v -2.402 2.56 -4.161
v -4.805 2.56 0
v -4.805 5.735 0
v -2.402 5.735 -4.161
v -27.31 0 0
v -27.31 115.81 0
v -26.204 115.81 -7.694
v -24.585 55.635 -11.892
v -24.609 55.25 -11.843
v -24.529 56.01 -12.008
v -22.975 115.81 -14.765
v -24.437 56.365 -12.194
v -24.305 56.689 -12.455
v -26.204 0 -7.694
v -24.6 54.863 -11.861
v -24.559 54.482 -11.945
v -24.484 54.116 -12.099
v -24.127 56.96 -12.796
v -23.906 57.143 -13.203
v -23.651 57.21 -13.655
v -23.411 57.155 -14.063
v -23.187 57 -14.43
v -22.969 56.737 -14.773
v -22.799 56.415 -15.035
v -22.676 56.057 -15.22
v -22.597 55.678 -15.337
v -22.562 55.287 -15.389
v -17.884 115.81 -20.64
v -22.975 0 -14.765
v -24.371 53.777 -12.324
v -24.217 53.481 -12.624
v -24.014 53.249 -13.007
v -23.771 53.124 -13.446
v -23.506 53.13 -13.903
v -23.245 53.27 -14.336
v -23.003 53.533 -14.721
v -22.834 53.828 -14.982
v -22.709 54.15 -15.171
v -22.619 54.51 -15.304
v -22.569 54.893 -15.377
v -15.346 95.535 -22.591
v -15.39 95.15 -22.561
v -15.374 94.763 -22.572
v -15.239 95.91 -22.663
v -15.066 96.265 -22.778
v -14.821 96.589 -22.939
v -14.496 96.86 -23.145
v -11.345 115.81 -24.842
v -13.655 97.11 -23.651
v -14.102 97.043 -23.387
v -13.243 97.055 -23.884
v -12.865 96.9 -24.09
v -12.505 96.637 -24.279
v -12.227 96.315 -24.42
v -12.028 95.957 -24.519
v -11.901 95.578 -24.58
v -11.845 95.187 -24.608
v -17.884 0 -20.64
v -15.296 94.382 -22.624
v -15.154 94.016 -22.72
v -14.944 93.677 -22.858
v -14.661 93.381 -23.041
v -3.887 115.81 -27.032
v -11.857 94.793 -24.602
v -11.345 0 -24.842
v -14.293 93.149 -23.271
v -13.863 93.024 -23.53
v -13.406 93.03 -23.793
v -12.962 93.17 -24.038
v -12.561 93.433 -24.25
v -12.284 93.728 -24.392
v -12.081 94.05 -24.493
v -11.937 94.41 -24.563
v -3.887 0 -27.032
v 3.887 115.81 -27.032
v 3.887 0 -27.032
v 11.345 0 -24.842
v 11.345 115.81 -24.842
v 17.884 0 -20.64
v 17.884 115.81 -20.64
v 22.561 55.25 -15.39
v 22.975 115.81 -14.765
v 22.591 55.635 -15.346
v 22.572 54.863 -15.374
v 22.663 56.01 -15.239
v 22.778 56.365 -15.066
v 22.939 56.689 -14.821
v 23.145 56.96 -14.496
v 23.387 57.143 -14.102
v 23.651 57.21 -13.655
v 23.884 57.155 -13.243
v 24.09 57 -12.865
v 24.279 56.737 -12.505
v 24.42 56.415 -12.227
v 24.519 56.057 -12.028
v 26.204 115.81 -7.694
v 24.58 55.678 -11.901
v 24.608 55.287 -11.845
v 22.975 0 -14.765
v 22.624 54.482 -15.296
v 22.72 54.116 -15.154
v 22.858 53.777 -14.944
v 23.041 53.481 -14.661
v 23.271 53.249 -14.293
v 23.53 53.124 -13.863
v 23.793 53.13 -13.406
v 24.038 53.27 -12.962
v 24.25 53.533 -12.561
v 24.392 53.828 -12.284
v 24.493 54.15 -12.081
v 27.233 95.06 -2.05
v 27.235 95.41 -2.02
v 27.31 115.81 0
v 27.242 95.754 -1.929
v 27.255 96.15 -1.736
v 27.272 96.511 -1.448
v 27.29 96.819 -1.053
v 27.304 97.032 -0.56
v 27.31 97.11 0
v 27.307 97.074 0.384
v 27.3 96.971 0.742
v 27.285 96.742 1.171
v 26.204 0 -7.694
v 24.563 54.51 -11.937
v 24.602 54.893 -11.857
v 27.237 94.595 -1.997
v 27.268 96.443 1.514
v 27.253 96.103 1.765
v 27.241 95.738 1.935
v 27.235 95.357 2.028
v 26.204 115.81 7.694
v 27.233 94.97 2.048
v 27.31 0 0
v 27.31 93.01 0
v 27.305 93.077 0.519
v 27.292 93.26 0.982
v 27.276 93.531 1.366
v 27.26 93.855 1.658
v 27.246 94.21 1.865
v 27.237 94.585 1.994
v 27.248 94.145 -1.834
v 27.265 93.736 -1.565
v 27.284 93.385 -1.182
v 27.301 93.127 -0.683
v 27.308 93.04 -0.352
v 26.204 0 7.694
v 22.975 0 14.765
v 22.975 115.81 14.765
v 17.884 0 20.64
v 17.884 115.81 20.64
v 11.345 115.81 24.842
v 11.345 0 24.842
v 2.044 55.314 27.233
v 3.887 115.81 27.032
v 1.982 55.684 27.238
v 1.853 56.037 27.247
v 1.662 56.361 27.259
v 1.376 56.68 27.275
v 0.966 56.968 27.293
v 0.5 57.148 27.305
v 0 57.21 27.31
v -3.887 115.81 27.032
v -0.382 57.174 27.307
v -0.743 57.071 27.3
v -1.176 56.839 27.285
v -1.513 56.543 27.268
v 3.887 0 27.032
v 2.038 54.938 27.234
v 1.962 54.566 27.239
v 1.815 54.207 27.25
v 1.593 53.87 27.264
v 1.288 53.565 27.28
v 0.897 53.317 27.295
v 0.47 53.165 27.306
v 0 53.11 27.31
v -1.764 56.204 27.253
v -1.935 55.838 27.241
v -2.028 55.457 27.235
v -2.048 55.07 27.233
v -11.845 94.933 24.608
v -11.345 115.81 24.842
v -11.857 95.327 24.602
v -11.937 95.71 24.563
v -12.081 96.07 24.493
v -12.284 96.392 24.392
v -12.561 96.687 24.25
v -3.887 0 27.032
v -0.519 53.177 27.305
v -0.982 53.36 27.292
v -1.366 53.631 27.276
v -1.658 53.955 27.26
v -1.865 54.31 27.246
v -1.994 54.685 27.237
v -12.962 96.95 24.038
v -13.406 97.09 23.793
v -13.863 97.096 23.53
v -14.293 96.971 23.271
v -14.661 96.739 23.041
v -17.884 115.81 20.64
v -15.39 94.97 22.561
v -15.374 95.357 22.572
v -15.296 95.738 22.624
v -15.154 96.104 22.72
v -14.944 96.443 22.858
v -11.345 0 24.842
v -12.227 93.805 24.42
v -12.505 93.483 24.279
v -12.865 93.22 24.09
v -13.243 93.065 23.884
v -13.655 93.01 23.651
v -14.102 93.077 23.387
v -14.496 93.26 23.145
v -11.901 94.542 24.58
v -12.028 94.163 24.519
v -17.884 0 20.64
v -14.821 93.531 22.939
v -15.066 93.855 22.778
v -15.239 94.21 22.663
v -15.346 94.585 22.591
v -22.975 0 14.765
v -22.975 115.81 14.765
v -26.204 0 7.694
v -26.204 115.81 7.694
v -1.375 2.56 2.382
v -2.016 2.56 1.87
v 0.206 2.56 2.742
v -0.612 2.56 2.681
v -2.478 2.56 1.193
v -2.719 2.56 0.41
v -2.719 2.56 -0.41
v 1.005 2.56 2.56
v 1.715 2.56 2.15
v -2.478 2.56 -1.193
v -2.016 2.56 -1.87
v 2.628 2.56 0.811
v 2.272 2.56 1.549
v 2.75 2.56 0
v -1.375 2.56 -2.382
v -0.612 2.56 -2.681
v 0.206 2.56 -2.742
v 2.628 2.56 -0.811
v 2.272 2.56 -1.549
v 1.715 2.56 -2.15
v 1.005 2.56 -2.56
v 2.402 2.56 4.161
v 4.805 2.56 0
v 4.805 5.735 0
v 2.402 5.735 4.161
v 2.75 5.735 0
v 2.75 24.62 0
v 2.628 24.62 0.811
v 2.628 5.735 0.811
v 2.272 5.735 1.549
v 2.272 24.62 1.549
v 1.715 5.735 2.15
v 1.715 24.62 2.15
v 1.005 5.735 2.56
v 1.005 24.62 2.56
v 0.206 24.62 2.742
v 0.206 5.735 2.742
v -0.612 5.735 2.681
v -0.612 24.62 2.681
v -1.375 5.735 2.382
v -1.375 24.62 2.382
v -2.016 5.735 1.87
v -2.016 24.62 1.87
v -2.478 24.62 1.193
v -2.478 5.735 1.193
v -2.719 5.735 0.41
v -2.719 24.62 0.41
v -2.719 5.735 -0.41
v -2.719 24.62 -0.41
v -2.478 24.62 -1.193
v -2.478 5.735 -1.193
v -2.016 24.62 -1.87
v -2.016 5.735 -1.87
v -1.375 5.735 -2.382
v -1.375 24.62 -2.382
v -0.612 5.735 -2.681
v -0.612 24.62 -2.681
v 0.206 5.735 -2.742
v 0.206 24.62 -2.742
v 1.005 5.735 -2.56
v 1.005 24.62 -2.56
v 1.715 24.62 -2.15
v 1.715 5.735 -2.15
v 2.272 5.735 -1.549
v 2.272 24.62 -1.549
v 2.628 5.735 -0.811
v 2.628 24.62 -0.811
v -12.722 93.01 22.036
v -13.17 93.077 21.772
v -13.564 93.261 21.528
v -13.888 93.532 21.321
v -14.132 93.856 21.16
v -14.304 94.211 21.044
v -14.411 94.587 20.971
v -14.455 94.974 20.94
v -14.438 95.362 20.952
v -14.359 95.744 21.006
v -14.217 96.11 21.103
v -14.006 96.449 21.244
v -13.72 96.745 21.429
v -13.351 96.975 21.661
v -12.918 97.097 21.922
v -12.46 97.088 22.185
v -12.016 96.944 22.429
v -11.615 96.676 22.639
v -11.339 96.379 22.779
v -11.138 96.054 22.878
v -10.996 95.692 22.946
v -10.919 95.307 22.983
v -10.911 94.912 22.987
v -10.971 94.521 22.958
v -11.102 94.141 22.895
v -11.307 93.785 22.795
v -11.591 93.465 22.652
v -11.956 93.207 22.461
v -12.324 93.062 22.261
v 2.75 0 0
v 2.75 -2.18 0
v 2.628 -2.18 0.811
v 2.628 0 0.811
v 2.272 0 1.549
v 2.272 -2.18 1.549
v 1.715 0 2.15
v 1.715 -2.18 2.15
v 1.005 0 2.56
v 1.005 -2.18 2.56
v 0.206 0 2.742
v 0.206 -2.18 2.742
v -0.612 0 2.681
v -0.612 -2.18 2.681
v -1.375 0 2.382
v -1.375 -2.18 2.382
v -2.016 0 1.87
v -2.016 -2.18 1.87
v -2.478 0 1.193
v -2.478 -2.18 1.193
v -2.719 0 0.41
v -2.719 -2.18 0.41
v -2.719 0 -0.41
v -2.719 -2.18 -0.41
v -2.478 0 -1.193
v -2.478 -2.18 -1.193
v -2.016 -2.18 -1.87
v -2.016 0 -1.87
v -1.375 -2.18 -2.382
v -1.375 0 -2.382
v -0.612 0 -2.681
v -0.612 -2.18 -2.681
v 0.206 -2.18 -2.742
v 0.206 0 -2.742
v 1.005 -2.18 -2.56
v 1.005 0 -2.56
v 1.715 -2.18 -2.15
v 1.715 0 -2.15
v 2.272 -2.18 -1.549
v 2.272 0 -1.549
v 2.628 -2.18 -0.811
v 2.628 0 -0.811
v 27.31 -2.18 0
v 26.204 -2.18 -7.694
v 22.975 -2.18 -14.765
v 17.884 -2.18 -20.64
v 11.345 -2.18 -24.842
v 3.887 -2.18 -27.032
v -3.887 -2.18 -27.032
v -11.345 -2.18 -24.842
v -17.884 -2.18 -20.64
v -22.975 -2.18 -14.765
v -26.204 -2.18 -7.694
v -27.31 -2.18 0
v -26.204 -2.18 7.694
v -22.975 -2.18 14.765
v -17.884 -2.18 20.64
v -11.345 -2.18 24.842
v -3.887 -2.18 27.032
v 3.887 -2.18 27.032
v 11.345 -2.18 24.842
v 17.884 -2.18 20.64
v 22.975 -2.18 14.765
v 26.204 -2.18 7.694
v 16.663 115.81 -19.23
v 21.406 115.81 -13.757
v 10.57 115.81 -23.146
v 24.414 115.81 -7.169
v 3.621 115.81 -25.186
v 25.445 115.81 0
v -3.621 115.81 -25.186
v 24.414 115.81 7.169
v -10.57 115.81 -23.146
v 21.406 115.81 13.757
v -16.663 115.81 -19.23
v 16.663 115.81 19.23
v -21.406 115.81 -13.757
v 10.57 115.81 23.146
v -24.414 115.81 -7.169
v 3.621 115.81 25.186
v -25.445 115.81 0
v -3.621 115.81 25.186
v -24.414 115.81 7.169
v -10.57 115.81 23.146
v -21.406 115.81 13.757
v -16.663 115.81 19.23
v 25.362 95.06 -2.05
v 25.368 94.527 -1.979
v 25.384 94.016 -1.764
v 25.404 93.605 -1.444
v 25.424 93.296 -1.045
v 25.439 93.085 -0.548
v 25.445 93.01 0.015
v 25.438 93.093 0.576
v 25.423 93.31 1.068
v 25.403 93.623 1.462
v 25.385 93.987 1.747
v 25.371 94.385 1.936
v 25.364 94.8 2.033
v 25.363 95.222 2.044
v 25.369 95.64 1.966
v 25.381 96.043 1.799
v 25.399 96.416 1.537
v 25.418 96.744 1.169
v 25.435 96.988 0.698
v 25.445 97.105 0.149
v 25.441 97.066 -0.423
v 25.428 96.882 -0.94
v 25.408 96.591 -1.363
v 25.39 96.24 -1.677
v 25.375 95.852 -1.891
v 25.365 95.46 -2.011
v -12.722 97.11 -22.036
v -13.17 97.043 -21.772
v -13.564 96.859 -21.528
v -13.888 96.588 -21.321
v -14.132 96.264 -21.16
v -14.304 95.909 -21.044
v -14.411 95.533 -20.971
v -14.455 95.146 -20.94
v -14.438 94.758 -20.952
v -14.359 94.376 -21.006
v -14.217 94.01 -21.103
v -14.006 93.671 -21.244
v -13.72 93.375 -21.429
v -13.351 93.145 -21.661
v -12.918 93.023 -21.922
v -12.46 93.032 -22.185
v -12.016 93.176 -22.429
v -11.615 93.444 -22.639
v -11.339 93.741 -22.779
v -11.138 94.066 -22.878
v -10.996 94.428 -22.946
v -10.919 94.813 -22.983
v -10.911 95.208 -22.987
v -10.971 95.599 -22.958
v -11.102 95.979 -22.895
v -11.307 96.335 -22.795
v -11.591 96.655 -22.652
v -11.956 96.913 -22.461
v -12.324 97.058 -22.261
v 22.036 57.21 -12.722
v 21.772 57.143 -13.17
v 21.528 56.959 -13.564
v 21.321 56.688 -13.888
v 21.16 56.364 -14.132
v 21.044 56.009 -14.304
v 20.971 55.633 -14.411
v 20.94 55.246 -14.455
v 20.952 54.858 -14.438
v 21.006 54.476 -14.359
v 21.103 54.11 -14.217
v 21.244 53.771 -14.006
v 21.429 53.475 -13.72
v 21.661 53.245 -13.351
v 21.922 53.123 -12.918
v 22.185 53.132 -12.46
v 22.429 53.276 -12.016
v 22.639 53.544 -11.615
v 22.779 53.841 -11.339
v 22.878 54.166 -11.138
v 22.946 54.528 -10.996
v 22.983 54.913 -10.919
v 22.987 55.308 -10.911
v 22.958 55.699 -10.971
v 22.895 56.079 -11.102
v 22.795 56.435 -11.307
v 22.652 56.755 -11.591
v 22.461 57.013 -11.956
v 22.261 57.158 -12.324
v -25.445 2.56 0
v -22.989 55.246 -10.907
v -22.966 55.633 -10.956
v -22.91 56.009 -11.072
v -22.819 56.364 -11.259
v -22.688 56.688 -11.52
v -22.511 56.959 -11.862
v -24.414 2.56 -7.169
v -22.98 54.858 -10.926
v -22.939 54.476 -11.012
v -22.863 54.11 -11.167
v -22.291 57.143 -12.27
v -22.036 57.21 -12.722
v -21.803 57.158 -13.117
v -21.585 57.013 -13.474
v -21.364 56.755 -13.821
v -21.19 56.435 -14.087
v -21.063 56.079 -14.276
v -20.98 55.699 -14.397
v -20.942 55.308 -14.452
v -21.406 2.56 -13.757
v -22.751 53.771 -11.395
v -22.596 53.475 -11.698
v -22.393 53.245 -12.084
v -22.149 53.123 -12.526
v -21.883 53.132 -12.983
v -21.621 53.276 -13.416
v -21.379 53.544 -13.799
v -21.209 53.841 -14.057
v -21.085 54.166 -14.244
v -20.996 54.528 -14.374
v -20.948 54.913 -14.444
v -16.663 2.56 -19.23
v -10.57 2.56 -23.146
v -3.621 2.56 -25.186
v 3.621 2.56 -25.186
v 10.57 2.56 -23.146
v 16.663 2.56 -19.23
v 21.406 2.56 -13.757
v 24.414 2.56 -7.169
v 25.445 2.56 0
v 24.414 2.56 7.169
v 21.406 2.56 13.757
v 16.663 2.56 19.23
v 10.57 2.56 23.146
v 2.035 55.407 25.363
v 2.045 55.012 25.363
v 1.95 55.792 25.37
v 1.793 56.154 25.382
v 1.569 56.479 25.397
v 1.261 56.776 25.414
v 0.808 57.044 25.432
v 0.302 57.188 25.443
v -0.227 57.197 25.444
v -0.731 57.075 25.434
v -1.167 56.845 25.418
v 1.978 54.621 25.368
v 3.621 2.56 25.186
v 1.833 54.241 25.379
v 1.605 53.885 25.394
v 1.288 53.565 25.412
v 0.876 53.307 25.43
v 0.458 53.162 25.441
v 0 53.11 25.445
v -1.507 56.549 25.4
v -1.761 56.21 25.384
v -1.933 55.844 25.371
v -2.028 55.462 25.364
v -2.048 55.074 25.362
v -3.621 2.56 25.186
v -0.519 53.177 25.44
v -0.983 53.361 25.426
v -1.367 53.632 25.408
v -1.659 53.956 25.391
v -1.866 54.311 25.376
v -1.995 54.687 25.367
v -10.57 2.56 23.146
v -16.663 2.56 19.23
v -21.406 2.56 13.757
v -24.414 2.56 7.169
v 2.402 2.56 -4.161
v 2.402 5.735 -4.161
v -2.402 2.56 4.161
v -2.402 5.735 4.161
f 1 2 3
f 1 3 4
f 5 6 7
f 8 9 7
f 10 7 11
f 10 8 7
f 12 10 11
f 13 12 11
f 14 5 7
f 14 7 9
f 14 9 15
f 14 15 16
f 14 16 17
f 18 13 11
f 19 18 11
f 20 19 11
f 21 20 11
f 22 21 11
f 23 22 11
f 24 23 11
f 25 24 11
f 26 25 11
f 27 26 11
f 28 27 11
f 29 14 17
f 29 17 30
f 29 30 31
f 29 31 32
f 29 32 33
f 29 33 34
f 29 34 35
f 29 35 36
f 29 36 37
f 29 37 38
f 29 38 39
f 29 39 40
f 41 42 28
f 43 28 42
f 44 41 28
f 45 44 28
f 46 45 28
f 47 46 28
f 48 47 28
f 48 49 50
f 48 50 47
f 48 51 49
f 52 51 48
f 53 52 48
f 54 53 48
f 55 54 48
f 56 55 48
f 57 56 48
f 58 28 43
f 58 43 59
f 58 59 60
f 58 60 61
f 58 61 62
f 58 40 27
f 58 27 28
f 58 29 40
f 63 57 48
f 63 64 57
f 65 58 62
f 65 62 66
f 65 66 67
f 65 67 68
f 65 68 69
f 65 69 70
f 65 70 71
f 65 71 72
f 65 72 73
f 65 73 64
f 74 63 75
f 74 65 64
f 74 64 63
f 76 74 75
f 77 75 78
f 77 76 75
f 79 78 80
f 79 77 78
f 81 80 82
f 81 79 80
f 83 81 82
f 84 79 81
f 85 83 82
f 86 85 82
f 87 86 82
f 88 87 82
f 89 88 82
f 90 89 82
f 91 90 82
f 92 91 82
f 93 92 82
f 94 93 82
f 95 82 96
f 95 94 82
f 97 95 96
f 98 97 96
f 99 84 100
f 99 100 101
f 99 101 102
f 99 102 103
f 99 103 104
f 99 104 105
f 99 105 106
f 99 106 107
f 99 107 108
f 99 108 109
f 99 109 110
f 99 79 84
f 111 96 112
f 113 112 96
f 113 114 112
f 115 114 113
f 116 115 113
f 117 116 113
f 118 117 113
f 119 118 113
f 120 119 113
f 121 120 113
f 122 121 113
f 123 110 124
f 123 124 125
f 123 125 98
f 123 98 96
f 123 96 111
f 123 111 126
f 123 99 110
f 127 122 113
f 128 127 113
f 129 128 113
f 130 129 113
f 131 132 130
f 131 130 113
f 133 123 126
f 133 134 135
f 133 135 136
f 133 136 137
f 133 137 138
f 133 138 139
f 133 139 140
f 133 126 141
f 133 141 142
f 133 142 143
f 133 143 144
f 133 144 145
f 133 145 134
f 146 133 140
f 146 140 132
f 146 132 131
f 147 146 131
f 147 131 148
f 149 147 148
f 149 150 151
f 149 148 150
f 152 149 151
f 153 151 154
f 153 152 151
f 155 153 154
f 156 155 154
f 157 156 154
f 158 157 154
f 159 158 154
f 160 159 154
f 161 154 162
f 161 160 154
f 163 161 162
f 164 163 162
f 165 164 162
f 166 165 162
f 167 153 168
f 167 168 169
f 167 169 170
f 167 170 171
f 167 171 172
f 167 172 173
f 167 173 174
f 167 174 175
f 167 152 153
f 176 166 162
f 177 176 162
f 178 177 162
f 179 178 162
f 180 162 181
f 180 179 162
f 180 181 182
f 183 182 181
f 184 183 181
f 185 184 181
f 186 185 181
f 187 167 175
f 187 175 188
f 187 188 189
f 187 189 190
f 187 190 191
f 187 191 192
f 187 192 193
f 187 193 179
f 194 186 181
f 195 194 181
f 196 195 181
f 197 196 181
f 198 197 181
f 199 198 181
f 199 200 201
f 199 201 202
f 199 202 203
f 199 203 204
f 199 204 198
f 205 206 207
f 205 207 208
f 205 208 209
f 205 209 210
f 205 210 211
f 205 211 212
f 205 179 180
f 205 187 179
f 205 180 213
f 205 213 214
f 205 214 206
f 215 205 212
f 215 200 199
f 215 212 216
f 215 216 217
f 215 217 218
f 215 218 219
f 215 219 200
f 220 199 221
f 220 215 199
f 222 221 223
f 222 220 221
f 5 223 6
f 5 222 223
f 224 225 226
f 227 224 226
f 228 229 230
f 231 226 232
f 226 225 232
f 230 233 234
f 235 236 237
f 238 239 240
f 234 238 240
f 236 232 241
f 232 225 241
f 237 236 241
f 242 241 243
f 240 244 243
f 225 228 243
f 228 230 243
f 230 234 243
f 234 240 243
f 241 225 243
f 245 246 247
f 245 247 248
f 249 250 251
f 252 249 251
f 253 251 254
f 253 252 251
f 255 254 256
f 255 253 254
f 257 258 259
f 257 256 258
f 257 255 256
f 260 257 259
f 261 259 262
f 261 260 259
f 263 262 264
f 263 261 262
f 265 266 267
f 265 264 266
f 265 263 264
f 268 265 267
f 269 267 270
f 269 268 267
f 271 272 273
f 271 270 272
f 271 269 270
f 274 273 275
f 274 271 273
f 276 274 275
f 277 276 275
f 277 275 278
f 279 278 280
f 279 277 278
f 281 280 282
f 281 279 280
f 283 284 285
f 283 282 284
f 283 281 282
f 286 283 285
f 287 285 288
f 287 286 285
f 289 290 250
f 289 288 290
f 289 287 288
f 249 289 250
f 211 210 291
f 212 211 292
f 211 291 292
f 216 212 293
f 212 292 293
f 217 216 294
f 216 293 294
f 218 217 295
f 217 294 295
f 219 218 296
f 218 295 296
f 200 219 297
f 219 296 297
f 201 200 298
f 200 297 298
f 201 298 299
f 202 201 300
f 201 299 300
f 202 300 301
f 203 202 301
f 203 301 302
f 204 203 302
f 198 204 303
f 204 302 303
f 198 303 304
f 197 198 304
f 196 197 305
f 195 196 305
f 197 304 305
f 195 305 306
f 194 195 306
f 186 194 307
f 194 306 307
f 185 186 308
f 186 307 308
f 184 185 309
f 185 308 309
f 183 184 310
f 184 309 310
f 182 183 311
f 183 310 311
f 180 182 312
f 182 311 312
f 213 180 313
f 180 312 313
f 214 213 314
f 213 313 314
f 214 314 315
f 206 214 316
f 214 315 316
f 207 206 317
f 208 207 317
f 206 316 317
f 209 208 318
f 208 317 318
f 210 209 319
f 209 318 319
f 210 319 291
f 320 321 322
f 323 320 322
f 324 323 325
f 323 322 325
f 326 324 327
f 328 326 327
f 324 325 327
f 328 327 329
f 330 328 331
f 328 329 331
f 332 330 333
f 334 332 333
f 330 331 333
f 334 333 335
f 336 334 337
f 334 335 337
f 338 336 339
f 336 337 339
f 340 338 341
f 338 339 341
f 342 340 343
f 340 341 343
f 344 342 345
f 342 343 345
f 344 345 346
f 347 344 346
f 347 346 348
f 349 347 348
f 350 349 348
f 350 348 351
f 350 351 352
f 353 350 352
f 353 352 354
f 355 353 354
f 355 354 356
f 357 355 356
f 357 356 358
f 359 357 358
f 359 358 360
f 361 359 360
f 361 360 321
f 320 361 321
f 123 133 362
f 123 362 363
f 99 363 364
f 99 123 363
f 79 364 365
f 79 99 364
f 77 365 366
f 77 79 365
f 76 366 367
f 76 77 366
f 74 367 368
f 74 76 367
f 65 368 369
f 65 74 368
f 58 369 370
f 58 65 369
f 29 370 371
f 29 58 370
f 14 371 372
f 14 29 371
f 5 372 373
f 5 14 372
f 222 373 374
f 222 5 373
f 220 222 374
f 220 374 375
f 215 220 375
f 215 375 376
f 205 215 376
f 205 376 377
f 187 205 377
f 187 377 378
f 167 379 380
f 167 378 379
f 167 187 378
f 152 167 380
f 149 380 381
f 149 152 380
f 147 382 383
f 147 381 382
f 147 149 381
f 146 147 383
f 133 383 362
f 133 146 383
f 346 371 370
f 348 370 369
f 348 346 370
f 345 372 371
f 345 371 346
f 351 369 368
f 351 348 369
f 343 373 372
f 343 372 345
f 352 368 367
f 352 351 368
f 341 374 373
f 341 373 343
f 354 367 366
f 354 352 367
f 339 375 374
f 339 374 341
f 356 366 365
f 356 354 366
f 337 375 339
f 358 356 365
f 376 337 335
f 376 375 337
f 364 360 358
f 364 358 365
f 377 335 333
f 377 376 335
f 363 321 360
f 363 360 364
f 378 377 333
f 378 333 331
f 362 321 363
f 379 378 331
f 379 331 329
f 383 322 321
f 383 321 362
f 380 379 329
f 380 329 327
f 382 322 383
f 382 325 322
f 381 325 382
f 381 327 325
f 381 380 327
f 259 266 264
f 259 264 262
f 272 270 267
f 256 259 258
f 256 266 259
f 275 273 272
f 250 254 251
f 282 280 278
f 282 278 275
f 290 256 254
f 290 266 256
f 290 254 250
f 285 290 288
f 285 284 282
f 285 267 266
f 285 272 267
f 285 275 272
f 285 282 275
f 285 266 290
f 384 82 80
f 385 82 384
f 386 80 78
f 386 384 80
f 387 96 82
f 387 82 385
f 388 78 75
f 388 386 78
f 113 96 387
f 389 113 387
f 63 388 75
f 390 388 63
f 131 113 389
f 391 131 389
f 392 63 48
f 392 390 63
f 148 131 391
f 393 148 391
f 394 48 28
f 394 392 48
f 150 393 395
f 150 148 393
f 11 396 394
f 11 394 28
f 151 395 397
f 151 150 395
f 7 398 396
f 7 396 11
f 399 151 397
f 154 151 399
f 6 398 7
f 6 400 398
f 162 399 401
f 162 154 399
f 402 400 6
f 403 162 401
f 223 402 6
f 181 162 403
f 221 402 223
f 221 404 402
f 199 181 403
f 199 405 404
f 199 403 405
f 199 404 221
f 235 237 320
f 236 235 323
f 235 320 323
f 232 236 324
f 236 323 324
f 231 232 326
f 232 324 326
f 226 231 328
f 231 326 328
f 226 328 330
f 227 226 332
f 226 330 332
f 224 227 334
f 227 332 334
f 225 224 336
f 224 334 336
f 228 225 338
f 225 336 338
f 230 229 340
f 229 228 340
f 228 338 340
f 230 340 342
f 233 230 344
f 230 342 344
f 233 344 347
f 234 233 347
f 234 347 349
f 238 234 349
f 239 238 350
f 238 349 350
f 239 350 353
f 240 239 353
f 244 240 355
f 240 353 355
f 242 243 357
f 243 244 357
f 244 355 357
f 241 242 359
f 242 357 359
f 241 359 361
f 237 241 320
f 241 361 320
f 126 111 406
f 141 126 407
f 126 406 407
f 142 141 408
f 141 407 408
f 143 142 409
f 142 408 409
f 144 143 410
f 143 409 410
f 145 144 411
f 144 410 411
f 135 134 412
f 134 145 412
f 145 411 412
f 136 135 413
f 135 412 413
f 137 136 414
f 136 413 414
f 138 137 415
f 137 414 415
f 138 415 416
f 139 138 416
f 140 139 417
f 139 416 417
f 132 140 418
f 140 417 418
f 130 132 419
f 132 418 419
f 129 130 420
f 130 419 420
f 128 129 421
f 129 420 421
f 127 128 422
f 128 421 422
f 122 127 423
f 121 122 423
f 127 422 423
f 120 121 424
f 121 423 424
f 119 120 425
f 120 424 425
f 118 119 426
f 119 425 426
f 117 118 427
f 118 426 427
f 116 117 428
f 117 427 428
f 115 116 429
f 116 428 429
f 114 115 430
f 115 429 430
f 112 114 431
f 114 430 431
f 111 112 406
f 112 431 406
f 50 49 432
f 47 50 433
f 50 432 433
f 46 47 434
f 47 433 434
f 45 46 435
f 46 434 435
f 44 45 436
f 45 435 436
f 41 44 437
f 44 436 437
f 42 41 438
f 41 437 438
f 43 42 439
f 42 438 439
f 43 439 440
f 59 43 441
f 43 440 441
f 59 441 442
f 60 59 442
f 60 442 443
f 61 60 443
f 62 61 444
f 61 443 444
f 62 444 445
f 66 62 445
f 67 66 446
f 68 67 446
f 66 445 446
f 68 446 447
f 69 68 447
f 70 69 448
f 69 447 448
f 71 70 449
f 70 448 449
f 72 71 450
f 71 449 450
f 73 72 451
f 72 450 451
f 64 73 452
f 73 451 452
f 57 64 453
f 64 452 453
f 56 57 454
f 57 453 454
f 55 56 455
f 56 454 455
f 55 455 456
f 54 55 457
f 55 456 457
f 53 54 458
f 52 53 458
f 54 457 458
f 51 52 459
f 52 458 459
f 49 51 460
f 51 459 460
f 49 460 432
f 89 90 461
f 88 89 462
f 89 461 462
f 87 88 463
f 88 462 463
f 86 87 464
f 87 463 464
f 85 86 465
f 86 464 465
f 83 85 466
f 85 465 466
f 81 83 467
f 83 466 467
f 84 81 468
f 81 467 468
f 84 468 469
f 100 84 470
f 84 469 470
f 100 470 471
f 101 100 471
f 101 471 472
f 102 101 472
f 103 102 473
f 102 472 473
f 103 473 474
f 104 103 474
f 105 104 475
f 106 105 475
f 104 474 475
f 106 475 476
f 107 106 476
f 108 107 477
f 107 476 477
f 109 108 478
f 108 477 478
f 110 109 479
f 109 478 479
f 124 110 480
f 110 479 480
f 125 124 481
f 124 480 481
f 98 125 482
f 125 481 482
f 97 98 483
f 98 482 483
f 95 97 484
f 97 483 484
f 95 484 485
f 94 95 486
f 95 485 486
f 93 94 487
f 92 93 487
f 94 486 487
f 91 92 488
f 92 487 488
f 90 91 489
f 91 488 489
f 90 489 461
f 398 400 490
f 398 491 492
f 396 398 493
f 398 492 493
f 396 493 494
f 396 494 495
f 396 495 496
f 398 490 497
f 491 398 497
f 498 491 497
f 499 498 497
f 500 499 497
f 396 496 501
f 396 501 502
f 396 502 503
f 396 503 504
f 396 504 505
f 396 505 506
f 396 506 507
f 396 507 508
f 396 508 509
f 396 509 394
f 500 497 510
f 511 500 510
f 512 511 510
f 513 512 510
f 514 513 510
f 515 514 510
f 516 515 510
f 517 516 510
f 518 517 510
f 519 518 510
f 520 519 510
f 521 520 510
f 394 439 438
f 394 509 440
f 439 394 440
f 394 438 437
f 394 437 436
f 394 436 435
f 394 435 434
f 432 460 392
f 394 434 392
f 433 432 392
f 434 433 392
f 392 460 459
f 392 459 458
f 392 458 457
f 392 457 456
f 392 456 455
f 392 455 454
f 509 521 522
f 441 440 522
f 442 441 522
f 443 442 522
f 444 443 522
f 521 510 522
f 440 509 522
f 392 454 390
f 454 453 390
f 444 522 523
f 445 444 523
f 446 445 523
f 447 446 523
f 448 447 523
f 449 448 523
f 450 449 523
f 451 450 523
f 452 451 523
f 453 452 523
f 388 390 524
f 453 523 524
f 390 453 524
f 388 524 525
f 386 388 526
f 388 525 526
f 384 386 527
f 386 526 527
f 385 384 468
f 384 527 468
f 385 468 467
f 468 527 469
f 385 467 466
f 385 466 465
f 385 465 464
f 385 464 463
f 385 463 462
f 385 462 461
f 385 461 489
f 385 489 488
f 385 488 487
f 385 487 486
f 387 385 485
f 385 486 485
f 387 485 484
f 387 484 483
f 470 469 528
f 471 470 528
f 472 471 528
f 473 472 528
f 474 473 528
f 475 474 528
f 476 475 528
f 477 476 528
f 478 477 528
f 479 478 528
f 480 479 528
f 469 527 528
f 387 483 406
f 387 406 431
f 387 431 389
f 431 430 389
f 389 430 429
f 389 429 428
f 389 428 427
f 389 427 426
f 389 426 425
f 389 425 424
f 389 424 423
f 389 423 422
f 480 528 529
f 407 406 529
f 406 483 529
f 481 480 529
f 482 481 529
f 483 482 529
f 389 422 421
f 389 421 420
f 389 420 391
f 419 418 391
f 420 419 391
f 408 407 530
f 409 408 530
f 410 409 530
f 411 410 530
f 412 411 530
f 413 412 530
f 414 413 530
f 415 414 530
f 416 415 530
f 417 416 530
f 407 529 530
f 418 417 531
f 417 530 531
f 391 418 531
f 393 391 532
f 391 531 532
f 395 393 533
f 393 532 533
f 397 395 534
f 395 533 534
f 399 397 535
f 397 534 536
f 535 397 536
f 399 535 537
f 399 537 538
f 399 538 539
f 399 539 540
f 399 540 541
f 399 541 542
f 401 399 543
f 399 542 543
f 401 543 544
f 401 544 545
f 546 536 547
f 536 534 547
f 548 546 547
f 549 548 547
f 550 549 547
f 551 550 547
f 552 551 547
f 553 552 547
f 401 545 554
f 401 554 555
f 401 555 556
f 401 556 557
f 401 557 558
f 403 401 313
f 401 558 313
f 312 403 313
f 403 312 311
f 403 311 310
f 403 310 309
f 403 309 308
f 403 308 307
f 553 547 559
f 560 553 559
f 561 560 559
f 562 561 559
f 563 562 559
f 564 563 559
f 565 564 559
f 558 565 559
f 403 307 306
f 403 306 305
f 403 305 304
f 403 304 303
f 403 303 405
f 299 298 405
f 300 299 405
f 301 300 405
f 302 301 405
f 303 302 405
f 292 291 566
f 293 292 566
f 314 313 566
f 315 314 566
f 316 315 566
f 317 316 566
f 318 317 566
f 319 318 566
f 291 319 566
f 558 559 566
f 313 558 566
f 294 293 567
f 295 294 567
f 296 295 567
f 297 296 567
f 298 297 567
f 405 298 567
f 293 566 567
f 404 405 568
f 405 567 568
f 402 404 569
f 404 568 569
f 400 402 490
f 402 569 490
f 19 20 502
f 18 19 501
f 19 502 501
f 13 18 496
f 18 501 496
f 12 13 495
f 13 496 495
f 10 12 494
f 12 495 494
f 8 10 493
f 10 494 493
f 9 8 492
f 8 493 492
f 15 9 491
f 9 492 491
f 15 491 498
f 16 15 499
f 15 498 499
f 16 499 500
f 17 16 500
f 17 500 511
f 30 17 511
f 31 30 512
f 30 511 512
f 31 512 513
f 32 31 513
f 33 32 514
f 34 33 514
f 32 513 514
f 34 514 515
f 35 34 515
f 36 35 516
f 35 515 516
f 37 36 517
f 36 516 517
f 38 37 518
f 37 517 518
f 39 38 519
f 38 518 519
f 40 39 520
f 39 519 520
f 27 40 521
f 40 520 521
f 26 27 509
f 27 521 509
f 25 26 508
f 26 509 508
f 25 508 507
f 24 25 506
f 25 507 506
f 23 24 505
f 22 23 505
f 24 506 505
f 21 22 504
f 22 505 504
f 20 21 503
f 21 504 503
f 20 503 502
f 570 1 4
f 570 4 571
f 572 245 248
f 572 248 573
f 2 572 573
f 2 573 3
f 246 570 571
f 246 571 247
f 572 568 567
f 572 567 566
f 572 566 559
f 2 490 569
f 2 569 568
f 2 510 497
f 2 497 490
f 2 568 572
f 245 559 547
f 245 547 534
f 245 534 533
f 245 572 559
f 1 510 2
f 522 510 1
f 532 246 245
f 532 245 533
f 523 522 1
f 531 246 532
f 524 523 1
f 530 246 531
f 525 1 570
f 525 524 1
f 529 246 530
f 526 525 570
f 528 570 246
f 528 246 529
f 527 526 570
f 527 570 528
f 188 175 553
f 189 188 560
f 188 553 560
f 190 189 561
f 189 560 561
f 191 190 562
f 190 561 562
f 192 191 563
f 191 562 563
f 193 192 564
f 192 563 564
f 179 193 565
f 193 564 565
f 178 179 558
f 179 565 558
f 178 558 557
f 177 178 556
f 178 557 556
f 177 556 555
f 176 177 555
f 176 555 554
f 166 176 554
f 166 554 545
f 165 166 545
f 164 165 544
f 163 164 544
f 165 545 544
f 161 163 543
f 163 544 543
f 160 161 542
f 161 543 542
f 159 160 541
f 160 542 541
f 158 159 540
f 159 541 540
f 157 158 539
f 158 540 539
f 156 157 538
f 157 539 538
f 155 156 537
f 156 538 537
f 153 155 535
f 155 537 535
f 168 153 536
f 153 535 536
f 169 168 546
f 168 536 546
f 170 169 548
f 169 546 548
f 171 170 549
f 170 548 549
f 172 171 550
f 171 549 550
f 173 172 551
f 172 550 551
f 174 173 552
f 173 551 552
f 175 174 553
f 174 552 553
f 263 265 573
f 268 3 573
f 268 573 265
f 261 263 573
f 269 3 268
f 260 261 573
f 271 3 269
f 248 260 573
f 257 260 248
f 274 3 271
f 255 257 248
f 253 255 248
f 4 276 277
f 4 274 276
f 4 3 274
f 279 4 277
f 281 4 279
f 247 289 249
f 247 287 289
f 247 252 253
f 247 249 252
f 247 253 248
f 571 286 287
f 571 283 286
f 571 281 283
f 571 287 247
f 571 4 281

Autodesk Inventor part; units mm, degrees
ref_plane "YZ Plane" through (0, 0, 0) normal (1, 0, 0) x (0, 1, 0)
sketch "Sketch1" plane through (0, 0, 0) normal (0, 1, 0) x (-1, 0, 0)
  circle A0 centre (0, 0) radius 27.31
  circle A1 centre (0, 0) radius 25.445
  dimension "d0" = 54.62
  dimension "d1" = 50.89
extrude "Extrusion1" add sketch "Sketch1" along normal blind 115.81
sketch "Sketch2" plane through (0, 0, 0) normal (0, -1, 0) x (1, 0, 0)
  circle A0 centre (0, 0) radius 27.31
extrude "Extrusion2" add sketch "Sketch2" along normal blind 2.18
sketch "Sketch3" plane through (0, -2.18, 0) normal (0, -1, 0) x (1, 0, 0)
  circle A0 centre (0, 0) radius 2.75
  dimension "d6" = 5.5
extrude "Extrusion3" cut sketch "Sketch3" against normal up to surface (2.18 mm away)
sketch "Sketch4" plane through (0, 0, 0) normal (0, 1, 0) x (1, 0, 0)
  circle A0 centre (0, 0) radius 2.75 projected
  circle A1 centre (0, 0) radius 25.445
  circle A2 centre (0, 0) radius 2.75
extrude "Extrusion4" add sketch "Sketch4" along normal blind 2.56
ref_plane "Work Plane1" through (0, 95.06, 0) normal (0, 1, 0) x (1, 0, 0)
sketch "Sketch6" plane through (0, 95.06, 0) normal (0, 1, 0) x (1, 0, 0)
  circle A0 centre (0, 0) radius 27.31 projected
  point P0 (27.31, 0)
  point P1 (-13.655, 23.6512)
  point P2 (-13.655, -23.6512)
  dimension "d18" = 360
hole "Hole1" at (-13.655, 95.06, -23.6512) direction (0.5, 0, 0.866) diameter 4.1 depth 2
hole "Hole2" at (-13.655, 95.06, 23.6512) direction (0.5, 0, -0.866) diameter 4.1 depth 2
hole "Hole3" at (27.31, 95.06, 0) direction (-1, 0, 0) diameter 4.1 depth 2
ref_plane "Work Plane2" through (0, 55.16, 0) normal (0, 1, 0) x (1, 0, 0)
sketch "Sketch7" plane through (0, 55.16, 0) normal (0, 1, 0) x (1, 0, 0)
  circle A0 centre (0, 0) radius 27.31 projected
  point P0 (0, -27.31)
  point P1 (23.6512, 13.655)
  point P2 (-23.6512, 13.655)
  dimension "d50" = 360
hole "Hole4" at (23.6512, 55.16, -13.655) direction (-0.866, 0, 0.5) diameter 4.1 depth 2
hole "Hole5" at (0, 55.16, 27.31) direction (0, 0, -1) diameter 4.1 depth 2
hole "Hole6" at (-23.6512, 55.16, -13.655) direction (0.866, 0, 0.5) diameter 4.1 depth 2
sketch "Sketch8" plane through (0, 2.56, 0) normal (0, 1, 0) x (1, 0, 0)
  circle A0 centre (0, 0) radius 2.75
  circle A1 centre (0, 0) radius 2.75 projected
  line L0 (-4.8047, 0) -> (-2.4023, 4.161)
  line L1 (-2.4023, 4.161) -> (2.4023, 4.161)
  line L2 (2.4023, 4.161) -> (4.8047, 0)
  line L3 (4.8047, 0) -> (2.4023, -4.161)
  line L4 (2.4023, -4.161) -> (-2.4023, -4.161)
  line L5 (-2.4023, -4.161) -> (-4.8047, 0)
extrude "Extrusion5" add sketch "Sketch8" along normal blind 22.06 contours A0
extrude "Extrusion6" add sketch "Sketch8" along normal blind 3.175
ref_plane "Work Plane3" through (-2.4023, 2.56, -0.919) normal (0, 0, 1) x (1, 0, 0)
properties part number "avbay"
